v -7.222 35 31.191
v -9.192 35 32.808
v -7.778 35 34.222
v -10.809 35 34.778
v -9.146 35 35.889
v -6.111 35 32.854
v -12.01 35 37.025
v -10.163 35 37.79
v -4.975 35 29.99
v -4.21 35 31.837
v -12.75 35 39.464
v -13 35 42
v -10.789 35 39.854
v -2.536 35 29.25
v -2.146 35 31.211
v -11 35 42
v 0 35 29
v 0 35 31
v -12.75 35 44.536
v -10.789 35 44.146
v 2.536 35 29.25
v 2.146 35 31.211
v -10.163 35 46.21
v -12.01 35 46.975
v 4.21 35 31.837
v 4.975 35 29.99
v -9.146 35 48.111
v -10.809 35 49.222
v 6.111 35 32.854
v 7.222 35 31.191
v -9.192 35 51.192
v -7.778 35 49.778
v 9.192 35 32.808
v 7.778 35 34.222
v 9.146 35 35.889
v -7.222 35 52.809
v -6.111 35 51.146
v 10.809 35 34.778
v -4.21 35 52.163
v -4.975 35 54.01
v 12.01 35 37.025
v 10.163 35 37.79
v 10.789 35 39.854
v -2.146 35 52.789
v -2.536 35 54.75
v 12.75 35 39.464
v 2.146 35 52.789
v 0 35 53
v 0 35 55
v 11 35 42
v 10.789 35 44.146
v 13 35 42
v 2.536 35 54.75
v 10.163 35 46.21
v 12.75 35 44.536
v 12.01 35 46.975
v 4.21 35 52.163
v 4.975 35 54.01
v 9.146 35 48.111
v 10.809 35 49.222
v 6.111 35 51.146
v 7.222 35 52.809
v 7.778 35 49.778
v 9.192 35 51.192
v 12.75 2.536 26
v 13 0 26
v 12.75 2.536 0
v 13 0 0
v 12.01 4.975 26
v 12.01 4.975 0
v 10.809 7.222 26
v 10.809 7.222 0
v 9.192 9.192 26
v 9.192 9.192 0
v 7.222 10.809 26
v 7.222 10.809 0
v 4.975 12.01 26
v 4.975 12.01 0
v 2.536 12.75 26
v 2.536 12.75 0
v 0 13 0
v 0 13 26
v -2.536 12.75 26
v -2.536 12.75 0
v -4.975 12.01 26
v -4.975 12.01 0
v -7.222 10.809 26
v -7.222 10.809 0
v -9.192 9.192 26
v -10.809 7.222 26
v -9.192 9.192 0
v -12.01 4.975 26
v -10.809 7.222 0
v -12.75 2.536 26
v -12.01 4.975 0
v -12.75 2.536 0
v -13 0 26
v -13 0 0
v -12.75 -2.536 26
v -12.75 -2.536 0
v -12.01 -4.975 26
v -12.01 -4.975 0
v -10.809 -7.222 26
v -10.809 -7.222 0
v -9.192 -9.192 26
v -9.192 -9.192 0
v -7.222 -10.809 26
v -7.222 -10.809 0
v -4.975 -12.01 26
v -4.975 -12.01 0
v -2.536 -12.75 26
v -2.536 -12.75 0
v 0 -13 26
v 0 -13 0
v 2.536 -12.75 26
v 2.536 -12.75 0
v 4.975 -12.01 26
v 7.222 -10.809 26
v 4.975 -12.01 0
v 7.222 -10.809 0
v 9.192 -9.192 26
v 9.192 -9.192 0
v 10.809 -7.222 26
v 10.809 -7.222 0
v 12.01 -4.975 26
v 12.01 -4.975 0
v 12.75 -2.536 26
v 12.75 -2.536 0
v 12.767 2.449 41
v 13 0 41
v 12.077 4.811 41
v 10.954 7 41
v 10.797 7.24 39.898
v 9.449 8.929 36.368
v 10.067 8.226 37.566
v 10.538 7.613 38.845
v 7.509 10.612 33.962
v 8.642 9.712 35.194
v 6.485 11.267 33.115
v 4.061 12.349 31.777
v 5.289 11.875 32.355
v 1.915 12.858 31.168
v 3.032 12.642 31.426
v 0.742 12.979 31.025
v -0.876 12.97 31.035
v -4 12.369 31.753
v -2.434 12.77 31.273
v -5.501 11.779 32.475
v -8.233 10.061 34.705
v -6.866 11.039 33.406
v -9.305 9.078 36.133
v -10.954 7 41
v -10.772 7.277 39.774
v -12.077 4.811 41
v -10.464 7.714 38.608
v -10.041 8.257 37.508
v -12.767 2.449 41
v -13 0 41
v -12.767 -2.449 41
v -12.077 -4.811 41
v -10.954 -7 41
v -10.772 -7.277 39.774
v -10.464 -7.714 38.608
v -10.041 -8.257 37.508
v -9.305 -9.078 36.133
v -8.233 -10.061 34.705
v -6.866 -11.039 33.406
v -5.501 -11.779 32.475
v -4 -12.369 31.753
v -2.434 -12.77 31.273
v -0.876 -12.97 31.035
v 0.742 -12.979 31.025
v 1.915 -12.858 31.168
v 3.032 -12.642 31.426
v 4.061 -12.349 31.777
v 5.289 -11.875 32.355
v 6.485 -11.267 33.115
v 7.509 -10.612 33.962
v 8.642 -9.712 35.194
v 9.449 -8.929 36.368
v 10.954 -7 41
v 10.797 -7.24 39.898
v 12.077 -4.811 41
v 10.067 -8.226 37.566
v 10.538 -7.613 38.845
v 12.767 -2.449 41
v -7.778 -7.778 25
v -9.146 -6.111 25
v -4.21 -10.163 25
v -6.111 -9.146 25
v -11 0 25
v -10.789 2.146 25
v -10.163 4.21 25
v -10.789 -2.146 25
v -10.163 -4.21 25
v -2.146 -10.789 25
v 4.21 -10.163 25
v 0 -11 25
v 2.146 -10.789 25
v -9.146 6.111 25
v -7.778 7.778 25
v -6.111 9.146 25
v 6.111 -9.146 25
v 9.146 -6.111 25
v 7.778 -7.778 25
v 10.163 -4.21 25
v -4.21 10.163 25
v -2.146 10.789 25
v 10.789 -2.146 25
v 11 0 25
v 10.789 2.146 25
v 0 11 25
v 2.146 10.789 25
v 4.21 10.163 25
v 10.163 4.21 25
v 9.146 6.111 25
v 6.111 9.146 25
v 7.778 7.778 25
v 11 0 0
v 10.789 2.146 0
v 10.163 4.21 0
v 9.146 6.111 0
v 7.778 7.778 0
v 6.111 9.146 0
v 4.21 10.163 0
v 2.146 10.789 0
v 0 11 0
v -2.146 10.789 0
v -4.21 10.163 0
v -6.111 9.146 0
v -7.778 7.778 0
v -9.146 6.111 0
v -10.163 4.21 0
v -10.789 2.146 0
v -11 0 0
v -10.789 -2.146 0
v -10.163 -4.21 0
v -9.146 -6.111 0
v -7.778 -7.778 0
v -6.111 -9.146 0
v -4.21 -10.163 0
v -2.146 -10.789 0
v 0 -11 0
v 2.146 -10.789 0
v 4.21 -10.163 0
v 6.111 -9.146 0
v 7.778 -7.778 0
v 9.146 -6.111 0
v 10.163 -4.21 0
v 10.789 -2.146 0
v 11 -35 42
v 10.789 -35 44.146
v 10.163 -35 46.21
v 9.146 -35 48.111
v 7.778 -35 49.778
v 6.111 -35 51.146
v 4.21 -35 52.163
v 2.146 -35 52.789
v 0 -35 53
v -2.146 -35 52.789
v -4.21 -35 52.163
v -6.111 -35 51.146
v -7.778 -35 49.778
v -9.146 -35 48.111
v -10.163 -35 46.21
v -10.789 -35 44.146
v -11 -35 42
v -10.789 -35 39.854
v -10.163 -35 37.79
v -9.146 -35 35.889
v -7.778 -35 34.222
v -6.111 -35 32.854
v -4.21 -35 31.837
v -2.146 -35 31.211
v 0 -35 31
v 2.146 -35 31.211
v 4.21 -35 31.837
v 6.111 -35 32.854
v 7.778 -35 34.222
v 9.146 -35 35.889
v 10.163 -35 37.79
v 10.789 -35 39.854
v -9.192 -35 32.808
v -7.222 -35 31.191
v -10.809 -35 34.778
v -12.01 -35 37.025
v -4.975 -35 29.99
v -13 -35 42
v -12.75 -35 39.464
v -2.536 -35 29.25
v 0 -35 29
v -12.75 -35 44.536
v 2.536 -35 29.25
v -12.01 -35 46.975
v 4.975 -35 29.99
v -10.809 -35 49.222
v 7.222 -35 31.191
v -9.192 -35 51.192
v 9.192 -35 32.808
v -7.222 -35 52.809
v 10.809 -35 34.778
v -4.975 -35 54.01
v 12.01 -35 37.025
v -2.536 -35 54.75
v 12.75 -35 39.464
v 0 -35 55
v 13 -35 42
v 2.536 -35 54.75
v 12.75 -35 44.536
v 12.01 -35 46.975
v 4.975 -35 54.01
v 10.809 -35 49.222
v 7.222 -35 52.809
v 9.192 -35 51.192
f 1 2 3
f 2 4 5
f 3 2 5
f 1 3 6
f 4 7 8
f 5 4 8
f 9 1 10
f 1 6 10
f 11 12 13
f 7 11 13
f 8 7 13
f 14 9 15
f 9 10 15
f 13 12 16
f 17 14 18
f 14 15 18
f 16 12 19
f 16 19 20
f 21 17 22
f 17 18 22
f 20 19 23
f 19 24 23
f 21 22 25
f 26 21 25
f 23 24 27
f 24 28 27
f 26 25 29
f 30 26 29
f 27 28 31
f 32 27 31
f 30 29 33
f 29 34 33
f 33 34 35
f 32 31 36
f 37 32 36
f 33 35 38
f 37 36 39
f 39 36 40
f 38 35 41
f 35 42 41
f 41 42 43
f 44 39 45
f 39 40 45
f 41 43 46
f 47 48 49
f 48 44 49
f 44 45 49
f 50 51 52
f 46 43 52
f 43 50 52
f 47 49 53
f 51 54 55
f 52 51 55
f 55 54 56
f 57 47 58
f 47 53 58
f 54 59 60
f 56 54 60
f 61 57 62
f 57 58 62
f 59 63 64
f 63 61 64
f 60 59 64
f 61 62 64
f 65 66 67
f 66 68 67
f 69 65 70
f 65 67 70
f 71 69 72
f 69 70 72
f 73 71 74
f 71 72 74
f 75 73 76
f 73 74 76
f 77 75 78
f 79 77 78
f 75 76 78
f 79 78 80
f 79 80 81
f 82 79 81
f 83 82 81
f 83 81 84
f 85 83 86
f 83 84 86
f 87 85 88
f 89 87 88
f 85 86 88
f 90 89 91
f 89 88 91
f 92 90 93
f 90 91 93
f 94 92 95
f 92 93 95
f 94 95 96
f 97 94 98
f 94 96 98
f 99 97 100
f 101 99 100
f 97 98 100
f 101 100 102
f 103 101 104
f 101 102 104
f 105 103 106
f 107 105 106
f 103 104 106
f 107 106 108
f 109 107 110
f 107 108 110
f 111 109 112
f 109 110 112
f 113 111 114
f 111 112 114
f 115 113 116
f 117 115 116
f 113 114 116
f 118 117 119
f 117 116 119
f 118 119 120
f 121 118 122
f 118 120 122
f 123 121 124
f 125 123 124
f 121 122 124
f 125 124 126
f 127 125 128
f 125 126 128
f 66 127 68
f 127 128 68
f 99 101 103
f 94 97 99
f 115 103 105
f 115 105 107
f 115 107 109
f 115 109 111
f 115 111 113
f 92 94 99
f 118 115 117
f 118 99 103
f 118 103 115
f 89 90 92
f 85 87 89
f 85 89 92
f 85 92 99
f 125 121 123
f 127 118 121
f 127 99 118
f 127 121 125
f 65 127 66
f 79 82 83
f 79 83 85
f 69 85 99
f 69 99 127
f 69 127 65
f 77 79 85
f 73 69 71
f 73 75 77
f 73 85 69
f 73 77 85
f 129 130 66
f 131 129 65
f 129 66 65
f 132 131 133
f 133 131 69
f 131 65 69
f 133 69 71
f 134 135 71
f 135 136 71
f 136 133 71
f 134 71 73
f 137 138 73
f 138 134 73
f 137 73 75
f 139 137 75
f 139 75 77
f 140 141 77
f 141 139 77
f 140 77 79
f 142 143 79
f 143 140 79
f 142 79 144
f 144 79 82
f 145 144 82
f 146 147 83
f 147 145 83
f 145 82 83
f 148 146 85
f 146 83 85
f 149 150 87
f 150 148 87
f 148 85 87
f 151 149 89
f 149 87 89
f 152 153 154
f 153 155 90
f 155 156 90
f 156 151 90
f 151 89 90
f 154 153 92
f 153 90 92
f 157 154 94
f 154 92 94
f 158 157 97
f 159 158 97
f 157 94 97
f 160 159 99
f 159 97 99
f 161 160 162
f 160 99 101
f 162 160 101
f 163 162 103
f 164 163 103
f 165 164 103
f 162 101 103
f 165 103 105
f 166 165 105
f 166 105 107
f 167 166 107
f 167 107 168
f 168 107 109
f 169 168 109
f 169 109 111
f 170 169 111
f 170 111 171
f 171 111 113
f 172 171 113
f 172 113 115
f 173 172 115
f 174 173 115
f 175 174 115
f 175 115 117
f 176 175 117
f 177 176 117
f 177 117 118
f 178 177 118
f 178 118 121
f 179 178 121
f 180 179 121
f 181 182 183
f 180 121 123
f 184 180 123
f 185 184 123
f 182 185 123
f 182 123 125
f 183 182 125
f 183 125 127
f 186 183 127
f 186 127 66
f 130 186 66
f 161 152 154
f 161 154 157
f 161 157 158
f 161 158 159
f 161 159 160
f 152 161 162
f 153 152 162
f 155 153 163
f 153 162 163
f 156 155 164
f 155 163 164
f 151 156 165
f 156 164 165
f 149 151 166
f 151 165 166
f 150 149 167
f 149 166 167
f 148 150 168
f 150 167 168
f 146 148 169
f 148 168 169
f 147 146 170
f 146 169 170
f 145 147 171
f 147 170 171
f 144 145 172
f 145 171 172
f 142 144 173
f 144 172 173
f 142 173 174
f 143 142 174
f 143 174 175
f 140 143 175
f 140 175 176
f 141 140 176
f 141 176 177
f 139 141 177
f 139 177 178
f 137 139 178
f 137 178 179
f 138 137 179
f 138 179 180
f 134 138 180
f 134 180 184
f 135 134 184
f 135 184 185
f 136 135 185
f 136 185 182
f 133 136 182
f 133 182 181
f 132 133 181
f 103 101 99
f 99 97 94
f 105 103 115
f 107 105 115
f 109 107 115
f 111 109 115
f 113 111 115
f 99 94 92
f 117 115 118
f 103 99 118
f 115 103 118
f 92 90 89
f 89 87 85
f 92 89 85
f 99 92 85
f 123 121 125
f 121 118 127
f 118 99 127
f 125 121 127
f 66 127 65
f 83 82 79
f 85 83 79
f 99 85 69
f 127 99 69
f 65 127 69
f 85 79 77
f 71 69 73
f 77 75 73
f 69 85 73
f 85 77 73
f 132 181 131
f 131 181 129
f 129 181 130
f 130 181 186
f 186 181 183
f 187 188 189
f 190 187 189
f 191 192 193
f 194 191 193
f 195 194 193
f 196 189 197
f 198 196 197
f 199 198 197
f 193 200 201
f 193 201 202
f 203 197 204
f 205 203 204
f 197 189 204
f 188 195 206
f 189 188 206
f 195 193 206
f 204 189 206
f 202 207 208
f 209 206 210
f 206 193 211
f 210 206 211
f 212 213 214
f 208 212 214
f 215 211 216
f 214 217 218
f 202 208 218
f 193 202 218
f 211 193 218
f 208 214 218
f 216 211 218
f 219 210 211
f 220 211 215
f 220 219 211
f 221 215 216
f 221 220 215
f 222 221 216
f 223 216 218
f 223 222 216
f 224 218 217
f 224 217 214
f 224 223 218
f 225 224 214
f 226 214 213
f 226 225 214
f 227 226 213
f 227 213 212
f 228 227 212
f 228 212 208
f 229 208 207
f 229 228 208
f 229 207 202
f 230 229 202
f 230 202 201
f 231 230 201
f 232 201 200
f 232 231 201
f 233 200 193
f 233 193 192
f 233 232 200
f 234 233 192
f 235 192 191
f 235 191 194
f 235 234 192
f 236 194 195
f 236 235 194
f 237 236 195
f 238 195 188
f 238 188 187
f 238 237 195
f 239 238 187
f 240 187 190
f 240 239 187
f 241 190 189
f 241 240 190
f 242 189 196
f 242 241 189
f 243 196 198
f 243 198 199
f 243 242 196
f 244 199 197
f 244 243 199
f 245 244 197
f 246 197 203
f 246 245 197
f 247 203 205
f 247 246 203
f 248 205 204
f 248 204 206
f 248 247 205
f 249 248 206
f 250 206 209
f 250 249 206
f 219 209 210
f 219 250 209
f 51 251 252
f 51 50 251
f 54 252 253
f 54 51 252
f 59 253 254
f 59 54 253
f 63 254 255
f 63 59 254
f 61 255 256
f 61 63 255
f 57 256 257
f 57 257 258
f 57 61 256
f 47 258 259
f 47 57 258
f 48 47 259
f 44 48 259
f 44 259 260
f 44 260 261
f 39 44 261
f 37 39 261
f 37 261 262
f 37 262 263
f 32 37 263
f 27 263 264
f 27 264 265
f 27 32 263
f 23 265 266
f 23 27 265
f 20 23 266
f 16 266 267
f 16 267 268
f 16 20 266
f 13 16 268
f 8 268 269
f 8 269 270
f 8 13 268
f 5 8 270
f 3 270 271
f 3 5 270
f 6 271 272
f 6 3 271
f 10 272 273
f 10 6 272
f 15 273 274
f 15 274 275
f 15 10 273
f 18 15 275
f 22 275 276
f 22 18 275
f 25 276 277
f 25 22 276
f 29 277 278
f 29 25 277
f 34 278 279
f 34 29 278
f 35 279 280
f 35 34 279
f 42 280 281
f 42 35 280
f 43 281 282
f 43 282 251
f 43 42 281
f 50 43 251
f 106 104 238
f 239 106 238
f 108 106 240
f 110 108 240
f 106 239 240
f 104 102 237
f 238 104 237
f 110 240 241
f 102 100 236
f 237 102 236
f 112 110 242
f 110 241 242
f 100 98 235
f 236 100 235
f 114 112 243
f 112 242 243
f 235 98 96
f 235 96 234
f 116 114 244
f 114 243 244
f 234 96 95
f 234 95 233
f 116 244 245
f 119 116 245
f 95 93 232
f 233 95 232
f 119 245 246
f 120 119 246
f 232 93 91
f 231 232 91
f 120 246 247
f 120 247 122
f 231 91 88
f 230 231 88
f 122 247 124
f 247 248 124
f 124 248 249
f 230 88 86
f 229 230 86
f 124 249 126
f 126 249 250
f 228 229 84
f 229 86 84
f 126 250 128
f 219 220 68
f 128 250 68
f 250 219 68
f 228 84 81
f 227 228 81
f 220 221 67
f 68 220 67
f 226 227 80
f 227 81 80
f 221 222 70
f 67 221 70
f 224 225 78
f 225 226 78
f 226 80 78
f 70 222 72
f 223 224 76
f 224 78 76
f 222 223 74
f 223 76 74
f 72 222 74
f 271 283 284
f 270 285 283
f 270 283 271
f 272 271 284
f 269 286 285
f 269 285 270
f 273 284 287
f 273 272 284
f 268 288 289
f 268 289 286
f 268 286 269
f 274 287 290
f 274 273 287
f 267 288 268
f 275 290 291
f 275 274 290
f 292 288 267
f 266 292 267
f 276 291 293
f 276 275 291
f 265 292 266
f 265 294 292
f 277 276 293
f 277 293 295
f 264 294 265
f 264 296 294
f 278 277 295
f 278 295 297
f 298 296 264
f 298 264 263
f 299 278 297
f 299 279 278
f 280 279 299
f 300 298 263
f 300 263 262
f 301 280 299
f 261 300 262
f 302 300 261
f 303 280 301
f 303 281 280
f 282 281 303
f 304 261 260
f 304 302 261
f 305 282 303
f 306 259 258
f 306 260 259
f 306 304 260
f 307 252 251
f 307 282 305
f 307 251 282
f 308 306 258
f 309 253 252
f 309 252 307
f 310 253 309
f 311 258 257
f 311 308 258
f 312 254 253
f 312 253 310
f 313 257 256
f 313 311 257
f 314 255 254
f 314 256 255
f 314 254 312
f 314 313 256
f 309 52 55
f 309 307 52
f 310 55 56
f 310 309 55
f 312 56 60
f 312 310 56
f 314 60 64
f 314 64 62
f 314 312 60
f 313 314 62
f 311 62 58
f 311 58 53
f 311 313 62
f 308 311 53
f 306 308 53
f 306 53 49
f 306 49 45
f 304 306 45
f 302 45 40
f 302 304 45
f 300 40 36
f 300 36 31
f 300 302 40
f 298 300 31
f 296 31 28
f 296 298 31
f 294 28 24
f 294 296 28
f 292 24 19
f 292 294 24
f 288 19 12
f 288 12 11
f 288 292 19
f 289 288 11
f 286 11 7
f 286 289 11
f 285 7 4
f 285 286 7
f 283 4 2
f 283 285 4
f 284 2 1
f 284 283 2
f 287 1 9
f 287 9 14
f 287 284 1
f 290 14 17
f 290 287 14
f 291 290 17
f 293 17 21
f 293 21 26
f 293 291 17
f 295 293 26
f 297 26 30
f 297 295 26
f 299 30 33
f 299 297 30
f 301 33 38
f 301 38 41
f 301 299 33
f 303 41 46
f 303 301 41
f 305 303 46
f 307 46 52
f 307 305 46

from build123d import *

# Parameters (mm, degrees)
F0_R     = 13
F0_R_2   = 11
F1_DEPTH = 25
F2_R     = 13
F2_R_2   = 11
F3_DEPTH = 35
F4_R     = 13
F5_DEPTH = 1
F6_R     = 13
F7_DEPTH = 15
F8_R     = 11
F9_DEPTH = 70


with BuildPart() as f1:
    # F0 (on Top) → F1 (new body)
    with BuildSketch(Plane.XY):
        Circle(F0_R)
        Circle(F0_R_2, mode=Mode.SUBTRACT)
    extrude(amount=F1_DEPTH)

    # F4 (on face) → F5 (join)
    with BuildSketch(Plane.XY.offset(25)):
        Circle(F4_R)
    extrude(amount=F5_DEPTH)


with BuildPart() as f3:
    # F2 (on Front) → F3 (new body, symmetric)
    with BuildSketch(Plane.XZ):
        with Locations((0, 42)):
            Circle(F2_R)
        with Locations((0, 42)):
            Circle(F2_R_2, mode=Mode.SUBTRACT)
    extrude(amount=F3_DEPTH, both=True)


with BuildPart() as f7:
    # F6 (on face) → F7 (new body)
    with BuildSketch(Plane.XY.offset(26)):
        Circle(F6_R)
    extrude(amount=F7_DEPTH)

    # F8 (on face) → F9 (cut)
    with BuildSketch(Plane.XZ.offset(35)):
        with Locations((0, 42)):
            Circle(F8_R)
    extrude(amount=-F9_DEPTH, mode=Mode.SUBTRACT)


solid = Compound([f1.part, f3.part, f7.part])
